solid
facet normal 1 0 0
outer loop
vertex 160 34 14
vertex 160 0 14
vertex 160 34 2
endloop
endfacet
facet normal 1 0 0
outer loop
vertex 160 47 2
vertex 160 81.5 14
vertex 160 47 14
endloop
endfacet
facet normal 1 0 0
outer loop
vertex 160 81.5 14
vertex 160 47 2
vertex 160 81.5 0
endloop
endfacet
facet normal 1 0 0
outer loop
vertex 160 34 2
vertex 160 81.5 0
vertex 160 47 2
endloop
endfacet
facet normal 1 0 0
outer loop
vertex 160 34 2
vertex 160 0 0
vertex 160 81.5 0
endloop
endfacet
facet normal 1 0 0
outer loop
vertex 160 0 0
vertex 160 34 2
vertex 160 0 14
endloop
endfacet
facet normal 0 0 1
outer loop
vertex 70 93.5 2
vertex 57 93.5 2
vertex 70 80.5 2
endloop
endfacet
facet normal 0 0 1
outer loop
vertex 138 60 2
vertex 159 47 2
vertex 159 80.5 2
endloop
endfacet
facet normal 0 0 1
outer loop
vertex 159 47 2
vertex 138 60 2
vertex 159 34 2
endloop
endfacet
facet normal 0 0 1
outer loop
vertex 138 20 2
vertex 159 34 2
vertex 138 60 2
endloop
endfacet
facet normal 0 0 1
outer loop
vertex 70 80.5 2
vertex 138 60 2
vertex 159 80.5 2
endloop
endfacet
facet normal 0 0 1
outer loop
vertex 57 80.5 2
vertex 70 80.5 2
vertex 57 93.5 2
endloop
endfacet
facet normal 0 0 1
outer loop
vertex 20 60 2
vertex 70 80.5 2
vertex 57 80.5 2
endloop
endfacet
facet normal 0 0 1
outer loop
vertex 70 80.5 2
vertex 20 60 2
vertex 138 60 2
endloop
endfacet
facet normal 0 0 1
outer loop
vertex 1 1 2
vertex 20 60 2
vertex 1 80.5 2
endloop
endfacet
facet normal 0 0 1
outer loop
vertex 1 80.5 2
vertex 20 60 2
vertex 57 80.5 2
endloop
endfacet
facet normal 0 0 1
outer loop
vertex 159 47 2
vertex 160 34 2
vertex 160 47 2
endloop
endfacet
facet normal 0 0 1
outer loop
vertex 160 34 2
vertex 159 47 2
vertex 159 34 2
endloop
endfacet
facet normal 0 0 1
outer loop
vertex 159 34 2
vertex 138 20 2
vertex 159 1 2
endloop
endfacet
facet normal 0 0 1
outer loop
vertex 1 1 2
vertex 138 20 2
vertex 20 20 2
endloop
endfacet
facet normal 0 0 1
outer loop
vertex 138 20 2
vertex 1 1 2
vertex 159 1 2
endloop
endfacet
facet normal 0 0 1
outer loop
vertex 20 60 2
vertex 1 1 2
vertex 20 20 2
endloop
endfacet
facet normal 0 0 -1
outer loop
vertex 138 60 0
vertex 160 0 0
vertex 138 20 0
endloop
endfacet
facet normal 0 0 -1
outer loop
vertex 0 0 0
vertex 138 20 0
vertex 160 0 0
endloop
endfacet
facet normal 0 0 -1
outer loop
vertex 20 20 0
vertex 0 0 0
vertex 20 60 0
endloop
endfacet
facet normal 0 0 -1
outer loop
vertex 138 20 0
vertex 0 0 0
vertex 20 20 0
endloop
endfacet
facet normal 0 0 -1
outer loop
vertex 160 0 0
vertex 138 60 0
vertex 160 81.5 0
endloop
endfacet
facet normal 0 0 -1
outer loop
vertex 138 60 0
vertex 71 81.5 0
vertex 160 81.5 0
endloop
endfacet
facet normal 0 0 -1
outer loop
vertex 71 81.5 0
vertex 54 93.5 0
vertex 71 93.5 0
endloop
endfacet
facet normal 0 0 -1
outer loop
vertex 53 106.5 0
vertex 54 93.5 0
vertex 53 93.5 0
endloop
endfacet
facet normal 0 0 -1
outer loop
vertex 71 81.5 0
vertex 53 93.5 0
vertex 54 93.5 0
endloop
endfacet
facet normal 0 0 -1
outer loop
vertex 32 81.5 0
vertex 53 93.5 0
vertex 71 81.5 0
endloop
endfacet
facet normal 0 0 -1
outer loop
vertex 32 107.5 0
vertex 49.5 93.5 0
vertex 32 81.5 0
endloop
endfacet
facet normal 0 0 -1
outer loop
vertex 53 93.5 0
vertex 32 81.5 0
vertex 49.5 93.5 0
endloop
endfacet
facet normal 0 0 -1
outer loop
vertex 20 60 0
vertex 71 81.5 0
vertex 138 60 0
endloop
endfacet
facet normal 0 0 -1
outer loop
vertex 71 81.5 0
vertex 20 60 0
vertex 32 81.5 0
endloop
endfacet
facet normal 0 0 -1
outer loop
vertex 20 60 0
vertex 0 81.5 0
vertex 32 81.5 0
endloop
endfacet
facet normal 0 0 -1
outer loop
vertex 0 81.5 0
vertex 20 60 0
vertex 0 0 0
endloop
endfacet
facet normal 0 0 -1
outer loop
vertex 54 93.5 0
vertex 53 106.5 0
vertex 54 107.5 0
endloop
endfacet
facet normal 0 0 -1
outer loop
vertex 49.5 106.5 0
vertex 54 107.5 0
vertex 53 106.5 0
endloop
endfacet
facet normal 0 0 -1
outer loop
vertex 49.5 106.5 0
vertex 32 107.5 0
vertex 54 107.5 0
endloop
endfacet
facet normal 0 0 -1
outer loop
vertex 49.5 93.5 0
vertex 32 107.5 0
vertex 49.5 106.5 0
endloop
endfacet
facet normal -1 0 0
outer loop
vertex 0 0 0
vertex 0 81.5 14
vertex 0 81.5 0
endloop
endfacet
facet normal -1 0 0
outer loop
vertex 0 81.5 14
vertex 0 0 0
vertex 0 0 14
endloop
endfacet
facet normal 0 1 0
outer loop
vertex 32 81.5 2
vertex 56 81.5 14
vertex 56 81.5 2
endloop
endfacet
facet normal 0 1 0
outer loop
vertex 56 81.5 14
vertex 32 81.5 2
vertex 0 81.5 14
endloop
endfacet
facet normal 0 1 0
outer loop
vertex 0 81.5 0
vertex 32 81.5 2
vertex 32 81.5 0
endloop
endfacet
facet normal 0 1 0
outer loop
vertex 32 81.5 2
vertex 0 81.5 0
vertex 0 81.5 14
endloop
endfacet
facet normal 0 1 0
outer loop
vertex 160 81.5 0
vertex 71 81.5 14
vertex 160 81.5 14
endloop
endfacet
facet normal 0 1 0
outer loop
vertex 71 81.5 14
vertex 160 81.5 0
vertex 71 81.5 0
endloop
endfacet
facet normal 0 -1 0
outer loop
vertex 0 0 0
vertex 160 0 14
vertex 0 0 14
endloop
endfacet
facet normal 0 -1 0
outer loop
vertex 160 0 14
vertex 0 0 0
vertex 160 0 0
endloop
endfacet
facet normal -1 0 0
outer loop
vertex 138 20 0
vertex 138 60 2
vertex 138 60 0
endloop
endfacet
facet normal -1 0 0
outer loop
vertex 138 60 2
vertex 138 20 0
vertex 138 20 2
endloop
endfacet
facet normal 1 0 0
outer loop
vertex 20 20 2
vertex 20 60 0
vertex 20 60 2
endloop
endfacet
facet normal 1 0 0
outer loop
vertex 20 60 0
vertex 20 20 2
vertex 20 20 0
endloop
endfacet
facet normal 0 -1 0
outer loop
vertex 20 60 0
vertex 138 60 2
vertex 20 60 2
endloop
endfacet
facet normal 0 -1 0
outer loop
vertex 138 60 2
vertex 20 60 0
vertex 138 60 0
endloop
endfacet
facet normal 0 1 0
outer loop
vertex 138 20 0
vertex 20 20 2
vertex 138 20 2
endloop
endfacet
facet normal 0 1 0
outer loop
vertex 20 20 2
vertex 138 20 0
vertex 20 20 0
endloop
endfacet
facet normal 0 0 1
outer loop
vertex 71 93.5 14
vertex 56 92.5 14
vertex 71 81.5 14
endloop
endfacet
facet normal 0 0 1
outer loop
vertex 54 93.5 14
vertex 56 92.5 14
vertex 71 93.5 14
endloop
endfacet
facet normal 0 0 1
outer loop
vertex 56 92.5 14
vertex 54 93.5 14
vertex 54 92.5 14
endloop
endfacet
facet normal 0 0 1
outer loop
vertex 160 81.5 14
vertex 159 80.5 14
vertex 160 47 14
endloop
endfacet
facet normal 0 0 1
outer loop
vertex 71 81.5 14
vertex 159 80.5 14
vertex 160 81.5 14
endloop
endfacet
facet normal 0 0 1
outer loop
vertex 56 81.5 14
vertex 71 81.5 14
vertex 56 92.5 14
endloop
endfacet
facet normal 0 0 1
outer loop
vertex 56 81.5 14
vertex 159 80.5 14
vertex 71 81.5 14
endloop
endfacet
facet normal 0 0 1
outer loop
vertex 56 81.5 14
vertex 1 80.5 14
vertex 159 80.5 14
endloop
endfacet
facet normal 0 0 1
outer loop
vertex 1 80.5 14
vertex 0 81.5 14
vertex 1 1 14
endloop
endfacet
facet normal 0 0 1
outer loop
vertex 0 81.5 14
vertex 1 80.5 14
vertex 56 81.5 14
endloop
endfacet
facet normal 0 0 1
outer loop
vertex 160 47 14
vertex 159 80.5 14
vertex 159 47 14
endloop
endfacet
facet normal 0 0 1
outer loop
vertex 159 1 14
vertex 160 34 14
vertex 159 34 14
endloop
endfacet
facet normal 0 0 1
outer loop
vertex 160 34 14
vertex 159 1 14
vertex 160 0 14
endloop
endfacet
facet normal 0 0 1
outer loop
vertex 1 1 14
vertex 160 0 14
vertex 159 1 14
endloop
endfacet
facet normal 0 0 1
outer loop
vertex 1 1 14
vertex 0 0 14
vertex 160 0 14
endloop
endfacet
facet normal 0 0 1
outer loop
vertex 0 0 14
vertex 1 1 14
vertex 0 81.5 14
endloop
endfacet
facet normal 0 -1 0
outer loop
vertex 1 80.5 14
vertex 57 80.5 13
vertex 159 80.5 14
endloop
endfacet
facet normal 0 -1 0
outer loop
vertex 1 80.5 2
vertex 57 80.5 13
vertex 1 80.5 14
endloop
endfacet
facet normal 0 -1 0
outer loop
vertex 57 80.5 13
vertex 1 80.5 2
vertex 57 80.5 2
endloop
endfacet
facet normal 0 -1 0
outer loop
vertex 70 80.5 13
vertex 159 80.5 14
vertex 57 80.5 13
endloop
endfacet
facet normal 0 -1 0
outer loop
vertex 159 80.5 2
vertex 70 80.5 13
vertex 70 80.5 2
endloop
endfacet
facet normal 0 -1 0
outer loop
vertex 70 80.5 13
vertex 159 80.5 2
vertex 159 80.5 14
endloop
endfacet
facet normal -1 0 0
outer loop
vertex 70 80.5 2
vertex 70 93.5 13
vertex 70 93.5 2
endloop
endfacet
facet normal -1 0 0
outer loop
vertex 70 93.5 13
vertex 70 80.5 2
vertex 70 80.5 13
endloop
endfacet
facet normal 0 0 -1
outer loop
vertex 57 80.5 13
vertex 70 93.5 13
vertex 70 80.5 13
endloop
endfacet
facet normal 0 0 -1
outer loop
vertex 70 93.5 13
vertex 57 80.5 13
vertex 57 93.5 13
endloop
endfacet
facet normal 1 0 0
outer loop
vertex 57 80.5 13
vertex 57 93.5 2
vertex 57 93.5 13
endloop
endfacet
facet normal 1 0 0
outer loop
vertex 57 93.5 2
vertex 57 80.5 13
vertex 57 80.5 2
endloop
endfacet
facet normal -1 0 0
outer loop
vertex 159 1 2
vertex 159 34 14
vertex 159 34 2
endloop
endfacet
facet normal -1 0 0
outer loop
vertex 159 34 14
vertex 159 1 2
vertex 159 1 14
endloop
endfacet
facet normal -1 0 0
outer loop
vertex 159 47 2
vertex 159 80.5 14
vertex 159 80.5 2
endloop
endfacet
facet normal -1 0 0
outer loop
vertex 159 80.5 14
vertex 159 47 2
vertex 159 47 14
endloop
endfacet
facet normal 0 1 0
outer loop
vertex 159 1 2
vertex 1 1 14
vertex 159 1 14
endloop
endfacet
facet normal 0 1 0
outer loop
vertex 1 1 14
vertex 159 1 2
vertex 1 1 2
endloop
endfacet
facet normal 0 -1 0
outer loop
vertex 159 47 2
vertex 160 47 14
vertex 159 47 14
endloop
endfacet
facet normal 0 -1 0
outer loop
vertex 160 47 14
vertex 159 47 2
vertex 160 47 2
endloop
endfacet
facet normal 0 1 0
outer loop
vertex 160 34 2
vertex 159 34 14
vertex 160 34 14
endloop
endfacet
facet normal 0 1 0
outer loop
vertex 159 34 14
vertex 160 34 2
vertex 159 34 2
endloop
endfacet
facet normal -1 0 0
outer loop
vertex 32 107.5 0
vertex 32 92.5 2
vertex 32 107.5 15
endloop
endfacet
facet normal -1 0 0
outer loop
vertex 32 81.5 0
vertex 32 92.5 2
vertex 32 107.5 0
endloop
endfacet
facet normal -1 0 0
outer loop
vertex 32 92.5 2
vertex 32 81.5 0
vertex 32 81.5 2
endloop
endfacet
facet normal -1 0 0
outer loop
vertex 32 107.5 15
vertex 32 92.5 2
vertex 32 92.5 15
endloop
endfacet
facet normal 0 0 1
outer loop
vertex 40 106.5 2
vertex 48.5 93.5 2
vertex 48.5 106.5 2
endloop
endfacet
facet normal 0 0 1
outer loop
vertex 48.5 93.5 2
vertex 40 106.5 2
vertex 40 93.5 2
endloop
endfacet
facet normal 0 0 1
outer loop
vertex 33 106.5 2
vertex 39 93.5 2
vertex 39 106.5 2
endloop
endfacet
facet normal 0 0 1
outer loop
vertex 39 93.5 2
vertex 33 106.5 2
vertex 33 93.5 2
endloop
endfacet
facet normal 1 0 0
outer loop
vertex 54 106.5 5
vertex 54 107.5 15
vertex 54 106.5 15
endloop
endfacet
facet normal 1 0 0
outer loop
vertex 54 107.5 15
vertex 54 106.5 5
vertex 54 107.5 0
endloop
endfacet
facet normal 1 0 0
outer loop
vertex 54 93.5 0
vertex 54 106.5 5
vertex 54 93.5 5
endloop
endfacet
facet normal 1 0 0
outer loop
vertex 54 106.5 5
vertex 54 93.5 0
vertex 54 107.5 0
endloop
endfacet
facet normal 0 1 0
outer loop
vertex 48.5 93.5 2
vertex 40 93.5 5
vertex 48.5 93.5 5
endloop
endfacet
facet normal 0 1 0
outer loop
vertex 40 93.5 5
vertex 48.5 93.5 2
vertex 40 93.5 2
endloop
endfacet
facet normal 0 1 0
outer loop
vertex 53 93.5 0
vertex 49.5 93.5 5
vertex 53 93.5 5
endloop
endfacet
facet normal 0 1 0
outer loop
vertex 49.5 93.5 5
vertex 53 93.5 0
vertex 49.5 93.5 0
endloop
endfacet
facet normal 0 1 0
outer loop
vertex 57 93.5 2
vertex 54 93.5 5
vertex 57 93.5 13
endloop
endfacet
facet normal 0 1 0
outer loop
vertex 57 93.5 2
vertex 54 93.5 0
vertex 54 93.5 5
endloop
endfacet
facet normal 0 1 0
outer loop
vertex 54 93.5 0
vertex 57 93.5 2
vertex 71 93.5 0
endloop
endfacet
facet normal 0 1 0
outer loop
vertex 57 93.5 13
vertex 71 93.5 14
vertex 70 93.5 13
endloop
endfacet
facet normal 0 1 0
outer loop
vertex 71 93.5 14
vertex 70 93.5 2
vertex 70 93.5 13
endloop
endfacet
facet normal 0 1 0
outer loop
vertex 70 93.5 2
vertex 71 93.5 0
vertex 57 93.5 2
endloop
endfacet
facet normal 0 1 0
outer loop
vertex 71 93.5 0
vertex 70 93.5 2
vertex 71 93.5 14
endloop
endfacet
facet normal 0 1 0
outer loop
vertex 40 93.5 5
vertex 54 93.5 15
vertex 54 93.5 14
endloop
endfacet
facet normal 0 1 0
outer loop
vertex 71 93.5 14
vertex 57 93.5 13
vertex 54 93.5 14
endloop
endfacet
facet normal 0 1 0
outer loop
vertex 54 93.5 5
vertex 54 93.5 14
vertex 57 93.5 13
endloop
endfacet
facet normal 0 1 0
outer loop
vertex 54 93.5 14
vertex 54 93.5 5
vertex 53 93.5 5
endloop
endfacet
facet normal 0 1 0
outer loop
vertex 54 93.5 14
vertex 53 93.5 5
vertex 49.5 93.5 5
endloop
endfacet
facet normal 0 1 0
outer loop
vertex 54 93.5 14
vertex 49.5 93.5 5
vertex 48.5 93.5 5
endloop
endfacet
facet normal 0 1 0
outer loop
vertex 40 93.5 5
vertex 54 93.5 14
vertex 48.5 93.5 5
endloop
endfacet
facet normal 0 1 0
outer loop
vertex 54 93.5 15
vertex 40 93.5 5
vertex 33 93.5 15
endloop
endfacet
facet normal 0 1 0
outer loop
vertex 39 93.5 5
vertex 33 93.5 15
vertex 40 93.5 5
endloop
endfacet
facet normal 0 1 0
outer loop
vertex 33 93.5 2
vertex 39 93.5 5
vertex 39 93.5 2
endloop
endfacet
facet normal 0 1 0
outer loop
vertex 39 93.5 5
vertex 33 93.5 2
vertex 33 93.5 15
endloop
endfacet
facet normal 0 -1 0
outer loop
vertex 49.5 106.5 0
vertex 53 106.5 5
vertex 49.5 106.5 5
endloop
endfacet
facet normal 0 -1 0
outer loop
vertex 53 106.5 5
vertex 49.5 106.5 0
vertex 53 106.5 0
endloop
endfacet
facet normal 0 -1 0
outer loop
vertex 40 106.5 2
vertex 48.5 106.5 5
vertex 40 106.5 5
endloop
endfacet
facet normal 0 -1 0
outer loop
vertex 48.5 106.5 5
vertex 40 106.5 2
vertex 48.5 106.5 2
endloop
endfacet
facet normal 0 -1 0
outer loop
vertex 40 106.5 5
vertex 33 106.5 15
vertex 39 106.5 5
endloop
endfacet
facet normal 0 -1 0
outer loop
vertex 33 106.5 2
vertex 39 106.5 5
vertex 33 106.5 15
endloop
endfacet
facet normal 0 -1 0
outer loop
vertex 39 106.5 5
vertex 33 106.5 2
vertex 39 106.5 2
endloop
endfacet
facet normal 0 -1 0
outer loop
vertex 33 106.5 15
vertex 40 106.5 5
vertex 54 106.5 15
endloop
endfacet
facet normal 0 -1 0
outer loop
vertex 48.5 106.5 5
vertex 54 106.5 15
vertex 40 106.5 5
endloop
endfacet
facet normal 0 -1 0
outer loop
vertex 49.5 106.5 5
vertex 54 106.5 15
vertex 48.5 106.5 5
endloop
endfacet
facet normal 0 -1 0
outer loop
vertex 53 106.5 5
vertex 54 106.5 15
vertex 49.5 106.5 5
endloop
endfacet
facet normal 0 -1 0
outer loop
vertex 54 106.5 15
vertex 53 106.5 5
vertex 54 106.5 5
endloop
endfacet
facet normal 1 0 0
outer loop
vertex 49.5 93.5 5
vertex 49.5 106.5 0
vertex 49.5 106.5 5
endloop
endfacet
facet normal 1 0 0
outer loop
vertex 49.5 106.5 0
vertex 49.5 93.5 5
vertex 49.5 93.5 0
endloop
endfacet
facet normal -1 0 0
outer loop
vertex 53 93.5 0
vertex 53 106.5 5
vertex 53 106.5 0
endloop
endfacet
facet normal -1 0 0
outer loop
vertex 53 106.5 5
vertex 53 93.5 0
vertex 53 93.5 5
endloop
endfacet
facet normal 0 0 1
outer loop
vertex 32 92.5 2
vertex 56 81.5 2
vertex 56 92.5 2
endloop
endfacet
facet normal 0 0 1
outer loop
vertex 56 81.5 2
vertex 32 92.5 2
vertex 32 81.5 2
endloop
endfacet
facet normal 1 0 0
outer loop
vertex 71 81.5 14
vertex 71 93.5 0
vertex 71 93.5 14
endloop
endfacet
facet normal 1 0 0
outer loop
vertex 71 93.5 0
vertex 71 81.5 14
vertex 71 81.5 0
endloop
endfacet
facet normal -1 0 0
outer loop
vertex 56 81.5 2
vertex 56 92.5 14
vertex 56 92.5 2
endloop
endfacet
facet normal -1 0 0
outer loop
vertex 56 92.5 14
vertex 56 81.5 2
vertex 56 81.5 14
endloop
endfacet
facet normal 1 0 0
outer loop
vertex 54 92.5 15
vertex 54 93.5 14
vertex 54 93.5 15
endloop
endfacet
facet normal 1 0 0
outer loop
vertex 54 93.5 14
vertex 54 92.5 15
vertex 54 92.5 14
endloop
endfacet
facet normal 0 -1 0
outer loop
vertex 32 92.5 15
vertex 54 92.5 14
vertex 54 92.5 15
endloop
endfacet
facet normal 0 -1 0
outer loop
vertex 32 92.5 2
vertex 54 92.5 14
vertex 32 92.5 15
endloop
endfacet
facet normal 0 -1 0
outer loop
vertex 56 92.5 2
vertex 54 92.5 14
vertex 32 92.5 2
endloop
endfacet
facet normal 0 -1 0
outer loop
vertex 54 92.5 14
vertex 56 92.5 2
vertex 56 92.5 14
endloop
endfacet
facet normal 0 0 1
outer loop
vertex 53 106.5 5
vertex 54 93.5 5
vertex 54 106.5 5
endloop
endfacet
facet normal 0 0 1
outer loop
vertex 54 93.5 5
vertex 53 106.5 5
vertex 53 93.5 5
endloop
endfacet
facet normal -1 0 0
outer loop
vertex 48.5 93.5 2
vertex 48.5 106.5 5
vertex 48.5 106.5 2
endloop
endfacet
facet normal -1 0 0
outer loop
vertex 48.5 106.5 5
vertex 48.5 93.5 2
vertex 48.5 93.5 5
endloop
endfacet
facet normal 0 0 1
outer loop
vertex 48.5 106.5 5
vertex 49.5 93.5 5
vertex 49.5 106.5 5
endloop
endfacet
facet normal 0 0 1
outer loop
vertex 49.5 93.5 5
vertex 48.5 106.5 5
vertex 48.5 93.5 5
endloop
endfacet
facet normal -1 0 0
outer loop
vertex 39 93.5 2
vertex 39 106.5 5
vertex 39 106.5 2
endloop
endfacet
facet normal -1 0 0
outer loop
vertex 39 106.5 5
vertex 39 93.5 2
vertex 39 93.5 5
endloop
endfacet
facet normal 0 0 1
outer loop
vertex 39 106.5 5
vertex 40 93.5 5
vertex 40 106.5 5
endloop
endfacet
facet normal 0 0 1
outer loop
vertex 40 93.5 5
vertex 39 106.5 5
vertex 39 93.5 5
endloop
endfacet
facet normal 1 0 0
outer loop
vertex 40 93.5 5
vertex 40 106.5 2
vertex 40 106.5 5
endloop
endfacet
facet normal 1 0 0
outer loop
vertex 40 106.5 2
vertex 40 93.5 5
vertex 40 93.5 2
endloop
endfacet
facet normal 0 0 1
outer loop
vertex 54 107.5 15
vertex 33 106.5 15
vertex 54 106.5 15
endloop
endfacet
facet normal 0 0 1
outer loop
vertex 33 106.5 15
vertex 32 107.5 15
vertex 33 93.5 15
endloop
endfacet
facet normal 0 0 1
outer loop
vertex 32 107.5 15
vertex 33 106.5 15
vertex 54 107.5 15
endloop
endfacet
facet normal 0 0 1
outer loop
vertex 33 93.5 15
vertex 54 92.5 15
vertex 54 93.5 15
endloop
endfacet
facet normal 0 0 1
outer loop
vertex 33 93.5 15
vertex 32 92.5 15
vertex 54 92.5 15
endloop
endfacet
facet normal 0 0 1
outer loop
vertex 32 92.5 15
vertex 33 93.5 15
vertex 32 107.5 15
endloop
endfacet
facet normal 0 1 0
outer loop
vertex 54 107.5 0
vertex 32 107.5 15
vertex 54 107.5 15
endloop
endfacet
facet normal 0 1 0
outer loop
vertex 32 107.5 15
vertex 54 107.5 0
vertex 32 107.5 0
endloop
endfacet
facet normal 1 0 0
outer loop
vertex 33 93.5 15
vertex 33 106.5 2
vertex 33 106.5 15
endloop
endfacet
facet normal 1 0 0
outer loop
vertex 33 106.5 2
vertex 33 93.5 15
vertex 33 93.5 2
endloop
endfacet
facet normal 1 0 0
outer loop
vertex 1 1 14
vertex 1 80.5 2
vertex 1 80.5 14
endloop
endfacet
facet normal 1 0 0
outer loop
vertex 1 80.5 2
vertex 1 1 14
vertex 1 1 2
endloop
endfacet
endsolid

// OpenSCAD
union() {
	// Device size is 144x75mm, but some padding is needed
        // Inner opening of 146x77 seems to work ok, but slightly loose
	// 1-156.7-1
	// |       |
	// 78     78
	// |       |
	// 1-156.7-1

	//base
	difference() {
		cube(size=[160,81.5,2]);
		translate([20,20,0])
			cube(size=[118,40,2]);
	}
	
	//left
	
	cube(size=[160,1,14]);
	
	//right
    difference() {
        translate([0,80.5,0])
            cube(size=[160,1,14]);
        translate([57,80.5,0])
            cube(size=[13,1,13]);
    }
	//top
    translate([0, 1, 0])
        cube(size=[1,80.5,14]);
	//bottom
	difference() {
		translate([159,1,0])
			cube(size=[1,80.5,14]);
		translate([159,34,0])
			cube(size=[1,13,14]); // cutout for usb charging
	}
	//right side servo mount
    //has to start from the bottom edge of
    //the slot because of the rotation,
    //so add 13 to the x-translate
	translate([71,81.5,0])
		rotate(180)
            servo_mount();
	
}

module servo_mount() {
	// Start from edge of hole that is 13 wide,
	// the edge *opposite* the servo mount

	// This section makes the hole for the slider to 
	// push the button, thus everything is translated
	translate([0,-12,0]) {
		// short base to connect to servo mount
		cube(size=[39,12,2]);
		// slide sides
		cube(size=[1,13,14]);
		translate([14,0,0])
			cube(size=[1,13,14]);
		translate([15,0,0])
			cube(size=[2,1,14]);
		//top
		translate([0,0,13])
			cube(size=[15,13,1]);

		// This section is just the servo mount by itself
		//base
		difference() {
			translate([17,-13,0])
				cube(size=[22,13,2]);
			translate([18,-13,0])
				cube(size=[3.5,13,2]);
		}
		translate([17,-13,0])
			cube(size=[1,13,5]);
		translate([21.5,-13,0])
			cube(size=[1,13,5]);
		translate([31,-13,0])
			cube(size=[1,13,5]);
		//side walls
		translate([17,0,0])
			cube(size=[22,1,15]);
		translate([17,-14,0])
			cube(size=[22,1,15]);
		//back wall
		translate([38,-14,0])
			cube(size=[1,14,15]);
	}
}
